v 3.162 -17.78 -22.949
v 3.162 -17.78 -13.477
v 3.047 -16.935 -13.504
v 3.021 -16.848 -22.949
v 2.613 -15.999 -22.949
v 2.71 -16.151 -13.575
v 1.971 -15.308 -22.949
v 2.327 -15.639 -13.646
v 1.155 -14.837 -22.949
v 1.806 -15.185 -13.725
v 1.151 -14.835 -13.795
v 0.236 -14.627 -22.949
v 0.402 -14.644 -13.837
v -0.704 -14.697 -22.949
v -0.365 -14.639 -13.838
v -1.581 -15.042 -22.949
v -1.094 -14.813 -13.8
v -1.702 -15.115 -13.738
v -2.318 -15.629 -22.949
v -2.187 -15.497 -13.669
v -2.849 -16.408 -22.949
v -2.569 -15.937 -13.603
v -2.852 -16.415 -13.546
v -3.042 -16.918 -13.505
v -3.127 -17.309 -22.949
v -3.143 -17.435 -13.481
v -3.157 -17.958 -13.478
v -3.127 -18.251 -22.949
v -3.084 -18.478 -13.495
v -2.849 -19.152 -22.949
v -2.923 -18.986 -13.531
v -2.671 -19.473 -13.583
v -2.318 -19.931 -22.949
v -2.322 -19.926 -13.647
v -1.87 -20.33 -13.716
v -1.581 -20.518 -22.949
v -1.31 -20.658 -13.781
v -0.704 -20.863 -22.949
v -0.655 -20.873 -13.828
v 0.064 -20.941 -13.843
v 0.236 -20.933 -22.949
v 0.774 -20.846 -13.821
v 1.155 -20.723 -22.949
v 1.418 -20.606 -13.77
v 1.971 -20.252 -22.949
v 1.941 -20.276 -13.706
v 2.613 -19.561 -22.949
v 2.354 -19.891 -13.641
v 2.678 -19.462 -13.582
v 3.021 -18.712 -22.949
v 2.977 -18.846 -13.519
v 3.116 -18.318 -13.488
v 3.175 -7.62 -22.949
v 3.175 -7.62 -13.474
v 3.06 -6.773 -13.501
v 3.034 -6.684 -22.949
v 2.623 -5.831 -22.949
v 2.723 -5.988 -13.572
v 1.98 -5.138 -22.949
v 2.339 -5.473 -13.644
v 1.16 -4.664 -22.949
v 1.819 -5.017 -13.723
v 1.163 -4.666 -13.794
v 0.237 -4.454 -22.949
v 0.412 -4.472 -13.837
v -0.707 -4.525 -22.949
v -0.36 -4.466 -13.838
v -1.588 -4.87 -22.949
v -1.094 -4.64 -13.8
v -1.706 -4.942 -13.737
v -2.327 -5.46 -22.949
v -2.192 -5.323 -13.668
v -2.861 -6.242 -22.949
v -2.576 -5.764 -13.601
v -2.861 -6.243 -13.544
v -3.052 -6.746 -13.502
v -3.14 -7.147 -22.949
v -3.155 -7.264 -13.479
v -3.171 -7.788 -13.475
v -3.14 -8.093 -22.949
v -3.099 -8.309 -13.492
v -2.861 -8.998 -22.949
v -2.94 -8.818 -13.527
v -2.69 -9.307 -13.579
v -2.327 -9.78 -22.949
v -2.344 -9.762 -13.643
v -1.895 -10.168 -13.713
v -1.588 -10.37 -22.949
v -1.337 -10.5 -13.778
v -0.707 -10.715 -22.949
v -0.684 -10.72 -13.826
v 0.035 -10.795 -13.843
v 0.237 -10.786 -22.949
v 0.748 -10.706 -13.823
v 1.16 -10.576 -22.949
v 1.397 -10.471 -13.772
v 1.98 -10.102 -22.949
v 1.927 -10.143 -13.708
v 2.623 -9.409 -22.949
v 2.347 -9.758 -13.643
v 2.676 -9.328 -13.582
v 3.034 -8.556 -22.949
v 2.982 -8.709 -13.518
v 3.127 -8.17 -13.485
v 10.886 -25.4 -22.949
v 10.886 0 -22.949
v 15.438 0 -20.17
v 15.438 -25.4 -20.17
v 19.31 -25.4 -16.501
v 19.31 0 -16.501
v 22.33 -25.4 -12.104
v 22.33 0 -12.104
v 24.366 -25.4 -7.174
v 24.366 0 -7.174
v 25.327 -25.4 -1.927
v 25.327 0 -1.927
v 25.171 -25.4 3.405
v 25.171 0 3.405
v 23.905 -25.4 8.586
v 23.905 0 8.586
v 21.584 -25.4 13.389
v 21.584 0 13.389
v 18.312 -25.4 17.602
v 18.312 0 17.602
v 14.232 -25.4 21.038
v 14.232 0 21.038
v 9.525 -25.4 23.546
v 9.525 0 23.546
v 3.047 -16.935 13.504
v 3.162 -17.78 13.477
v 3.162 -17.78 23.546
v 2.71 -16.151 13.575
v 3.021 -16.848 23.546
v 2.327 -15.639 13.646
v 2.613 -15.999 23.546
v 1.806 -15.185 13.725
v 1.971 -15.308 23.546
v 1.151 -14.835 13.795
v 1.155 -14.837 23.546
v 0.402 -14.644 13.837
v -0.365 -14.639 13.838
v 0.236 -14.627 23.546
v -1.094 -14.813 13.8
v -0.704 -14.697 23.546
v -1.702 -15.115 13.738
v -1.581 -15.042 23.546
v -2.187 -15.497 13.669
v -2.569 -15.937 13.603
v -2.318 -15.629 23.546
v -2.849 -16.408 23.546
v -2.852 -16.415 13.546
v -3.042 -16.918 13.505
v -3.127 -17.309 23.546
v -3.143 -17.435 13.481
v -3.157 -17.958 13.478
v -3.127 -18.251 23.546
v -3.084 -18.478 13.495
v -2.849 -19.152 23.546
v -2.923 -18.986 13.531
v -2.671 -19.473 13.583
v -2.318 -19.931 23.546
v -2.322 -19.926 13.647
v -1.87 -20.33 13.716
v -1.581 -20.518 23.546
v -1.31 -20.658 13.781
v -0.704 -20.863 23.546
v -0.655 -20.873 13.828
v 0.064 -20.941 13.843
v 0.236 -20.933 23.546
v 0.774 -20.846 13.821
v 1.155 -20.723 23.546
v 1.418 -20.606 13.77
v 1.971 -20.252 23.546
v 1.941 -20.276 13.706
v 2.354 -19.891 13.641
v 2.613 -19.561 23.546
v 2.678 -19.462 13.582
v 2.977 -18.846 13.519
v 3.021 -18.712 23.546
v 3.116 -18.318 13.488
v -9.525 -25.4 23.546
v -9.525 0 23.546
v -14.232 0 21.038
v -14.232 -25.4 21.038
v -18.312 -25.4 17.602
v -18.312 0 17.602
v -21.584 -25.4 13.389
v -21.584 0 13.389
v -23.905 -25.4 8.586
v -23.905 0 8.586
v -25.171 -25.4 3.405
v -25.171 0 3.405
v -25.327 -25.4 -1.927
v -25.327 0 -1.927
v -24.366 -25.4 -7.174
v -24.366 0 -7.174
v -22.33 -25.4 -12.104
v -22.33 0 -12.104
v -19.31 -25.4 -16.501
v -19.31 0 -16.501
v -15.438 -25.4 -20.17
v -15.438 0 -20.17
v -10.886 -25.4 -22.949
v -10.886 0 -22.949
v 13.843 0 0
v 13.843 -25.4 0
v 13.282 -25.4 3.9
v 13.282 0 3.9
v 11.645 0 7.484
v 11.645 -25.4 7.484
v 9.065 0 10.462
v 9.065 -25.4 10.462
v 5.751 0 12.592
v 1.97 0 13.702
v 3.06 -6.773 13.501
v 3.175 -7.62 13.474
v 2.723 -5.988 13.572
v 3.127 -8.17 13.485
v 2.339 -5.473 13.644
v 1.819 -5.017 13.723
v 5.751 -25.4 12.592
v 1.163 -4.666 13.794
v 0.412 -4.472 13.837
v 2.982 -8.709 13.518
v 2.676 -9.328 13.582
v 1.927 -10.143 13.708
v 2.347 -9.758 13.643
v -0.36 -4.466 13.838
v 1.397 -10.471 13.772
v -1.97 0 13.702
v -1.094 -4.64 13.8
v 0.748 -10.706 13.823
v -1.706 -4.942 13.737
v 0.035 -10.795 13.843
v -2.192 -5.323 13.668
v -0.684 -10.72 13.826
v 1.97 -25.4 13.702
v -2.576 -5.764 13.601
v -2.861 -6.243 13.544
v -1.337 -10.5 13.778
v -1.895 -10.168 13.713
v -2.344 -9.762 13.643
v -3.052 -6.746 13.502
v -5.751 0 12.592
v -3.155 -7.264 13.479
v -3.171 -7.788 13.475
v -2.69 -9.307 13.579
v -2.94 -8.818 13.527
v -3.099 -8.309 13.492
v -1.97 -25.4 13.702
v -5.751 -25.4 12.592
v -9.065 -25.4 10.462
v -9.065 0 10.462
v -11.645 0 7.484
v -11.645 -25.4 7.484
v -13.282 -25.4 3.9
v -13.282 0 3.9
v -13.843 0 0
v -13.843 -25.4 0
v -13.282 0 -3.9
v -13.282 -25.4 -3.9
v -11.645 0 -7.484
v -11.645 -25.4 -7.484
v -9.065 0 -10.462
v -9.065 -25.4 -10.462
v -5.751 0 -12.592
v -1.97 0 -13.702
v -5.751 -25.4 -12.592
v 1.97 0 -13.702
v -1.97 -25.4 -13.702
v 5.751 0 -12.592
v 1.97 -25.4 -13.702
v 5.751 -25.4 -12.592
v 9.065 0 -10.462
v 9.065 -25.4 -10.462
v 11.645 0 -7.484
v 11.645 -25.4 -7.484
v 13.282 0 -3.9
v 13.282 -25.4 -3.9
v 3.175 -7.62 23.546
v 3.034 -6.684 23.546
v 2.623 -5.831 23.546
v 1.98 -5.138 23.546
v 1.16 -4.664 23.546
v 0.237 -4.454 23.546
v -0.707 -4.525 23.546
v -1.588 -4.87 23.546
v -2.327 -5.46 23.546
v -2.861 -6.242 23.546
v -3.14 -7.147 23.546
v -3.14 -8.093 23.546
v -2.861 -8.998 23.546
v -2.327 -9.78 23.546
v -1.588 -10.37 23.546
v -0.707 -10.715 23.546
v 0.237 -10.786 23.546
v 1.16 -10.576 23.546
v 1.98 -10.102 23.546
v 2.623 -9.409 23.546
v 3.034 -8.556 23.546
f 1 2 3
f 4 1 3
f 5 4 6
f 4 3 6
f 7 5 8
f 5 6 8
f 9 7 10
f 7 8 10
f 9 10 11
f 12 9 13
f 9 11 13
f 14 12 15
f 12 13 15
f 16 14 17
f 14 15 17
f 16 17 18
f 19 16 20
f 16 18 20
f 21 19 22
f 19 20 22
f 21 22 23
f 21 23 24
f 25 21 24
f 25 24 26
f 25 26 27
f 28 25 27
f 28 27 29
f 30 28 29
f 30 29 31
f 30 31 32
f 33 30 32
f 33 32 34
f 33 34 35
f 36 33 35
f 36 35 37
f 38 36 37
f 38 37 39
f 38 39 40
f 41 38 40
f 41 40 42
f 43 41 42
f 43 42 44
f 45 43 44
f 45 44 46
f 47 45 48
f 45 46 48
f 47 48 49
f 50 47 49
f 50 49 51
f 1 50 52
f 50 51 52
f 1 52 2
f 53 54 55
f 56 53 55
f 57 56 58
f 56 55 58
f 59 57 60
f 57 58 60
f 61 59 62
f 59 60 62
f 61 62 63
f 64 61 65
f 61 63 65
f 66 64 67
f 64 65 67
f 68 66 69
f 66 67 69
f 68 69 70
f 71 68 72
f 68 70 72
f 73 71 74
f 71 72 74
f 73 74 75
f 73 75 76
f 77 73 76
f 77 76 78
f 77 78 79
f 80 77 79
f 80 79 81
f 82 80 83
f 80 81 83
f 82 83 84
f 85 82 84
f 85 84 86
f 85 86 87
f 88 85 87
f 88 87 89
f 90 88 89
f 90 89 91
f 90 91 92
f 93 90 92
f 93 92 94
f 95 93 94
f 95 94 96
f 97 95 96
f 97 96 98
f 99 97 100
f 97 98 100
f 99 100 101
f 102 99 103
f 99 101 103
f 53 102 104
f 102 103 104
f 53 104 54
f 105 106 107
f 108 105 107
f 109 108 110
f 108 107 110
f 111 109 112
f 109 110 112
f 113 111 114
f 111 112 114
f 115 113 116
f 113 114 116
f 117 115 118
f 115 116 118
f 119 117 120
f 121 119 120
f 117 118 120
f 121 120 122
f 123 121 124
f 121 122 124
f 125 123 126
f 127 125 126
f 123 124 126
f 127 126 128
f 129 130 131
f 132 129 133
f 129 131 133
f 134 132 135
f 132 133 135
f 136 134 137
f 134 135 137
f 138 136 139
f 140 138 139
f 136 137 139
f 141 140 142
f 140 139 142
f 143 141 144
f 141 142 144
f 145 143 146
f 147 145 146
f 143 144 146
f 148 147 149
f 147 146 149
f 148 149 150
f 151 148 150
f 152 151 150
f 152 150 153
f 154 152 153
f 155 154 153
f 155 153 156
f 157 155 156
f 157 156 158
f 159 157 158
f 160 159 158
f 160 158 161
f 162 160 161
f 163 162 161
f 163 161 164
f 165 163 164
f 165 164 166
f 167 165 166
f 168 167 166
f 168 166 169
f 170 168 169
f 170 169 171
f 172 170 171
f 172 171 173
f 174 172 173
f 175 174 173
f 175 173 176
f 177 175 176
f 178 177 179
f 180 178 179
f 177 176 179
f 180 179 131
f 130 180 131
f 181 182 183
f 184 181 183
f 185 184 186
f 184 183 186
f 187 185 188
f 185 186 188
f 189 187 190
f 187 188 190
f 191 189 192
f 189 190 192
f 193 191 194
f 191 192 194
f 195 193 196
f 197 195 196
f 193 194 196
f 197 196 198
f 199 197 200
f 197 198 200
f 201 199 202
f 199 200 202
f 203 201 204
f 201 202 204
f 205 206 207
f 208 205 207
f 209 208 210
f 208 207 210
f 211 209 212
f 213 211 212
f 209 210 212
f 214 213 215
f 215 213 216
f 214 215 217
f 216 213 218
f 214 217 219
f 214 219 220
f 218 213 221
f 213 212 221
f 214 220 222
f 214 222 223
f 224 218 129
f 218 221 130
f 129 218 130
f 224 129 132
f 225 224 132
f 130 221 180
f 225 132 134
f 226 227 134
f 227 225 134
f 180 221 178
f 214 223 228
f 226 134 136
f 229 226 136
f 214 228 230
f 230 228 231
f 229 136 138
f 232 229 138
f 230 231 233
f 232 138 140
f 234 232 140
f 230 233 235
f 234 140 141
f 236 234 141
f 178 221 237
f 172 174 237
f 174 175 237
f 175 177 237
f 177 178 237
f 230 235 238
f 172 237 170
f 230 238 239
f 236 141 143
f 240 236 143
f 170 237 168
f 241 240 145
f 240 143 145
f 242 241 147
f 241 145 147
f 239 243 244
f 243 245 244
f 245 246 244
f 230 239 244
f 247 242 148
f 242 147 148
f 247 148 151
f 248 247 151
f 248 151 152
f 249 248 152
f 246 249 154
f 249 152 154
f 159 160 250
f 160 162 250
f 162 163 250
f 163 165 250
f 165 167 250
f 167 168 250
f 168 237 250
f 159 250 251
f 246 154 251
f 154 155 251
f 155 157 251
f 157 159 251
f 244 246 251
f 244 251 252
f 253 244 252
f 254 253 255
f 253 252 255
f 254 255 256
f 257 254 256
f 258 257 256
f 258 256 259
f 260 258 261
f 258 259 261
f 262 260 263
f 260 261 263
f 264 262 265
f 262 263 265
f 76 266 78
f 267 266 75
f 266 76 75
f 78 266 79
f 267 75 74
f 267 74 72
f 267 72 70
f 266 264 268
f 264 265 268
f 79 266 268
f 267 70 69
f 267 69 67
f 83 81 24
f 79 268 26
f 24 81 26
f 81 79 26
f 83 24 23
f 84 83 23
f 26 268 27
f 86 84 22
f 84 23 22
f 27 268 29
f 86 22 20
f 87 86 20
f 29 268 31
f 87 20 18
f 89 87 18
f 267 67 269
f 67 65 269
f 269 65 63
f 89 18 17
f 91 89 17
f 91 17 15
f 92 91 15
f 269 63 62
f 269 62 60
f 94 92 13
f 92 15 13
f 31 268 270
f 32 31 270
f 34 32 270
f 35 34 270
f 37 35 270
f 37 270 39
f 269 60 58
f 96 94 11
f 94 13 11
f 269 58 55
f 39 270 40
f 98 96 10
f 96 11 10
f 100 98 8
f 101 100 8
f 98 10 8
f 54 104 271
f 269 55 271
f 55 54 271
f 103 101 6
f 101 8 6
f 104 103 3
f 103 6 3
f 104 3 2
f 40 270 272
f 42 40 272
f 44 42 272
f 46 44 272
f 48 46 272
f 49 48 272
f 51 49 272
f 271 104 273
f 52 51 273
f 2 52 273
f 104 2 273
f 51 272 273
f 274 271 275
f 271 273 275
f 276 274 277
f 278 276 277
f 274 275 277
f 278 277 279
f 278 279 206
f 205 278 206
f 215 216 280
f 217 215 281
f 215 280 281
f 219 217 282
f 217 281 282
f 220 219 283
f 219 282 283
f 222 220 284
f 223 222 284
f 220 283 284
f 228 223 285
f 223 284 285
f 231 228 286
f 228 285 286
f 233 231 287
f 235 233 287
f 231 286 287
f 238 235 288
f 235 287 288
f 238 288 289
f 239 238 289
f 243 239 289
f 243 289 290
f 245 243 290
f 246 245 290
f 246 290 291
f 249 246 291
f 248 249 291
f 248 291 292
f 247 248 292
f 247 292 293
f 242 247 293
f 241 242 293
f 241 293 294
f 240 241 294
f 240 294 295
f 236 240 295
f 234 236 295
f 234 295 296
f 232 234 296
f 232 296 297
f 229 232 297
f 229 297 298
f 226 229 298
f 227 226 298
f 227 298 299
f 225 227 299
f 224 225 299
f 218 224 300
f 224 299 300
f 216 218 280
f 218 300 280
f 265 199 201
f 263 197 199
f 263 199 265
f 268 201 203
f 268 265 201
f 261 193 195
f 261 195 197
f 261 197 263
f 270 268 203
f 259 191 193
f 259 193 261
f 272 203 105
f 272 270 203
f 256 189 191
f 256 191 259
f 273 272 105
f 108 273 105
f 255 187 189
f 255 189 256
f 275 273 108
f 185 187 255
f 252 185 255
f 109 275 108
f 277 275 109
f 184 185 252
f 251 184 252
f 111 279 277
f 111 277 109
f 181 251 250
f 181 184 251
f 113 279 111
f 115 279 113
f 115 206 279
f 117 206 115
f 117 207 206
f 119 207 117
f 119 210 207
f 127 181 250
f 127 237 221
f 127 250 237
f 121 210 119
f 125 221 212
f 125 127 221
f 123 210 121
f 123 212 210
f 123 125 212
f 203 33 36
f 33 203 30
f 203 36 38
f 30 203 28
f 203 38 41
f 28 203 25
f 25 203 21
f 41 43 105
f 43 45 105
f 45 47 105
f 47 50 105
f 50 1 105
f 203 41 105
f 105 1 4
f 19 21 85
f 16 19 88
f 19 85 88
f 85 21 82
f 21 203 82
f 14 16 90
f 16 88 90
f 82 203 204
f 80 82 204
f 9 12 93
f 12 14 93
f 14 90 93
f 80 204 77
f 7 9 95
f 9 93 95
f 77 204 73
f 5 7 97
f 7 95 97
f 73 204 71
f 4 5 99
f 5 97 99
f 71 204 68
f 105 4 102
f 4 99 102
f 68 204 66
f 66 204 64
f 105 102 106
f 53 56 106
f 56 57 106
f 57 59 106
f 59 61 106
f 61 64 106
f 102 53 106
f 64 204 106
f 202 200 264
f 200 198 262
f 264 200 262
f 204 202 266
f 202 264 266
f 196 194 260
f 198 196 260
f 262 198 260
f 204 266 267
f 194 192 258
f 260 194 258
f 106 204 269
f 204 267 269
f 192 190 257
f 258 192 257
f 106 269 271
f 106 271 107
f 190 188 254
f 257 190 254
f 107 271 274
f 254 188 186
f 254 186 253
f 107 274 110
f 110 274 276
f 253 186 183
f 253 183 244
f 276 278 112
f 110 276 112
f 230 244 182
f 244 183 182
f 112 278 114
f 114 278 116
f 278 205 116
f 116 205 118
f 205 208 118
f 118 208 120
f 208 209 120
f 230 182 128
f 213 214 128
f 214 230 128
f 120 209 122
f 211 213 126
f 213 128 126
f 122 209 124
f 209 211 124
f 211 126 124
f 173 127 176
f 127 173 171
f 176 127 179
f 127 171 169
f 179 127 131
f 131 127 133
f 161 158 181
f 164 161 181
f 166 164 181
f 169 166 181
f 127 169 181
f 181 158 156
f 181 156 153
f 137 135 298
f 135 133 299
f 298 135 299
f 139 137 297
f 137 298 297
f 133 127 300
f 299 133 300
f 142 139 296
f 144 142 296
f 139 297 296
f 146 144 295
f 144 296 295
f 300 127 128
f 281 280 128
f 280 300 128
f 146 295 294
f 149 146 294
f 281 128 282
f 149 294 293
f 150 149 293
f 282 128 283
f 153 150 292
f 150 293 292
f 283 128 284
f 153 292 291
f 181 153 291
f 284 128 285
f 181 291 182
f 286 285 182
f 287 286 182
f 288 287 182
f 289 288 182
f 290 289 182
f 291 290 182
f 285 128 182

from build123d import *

# Parameters (mm, degrees)
F0_R     = 1.5875
F1_DEPTH = 25.4
F2_R     = 3.175
F2_R_2   = 3.161961
F3_DEPTH = 46.496531
F4_R     = 13.843
F5_DEPTH = 25.401


with BuildPart() as f1:
    # F0 (on Front) → F1 (new body)
    with BuildSketch(Plane.XZ):
        with BuildLine():
            Line((9.525, 23.54643), (-9.525, 23.54643))
            ThreePointArc((-9.525, 23.54643), (-25.38913, 0.743025), (-10.885714, -22.949101))
            Line((-10.885714, -22.949101), (10.885714, -22.949101))
            ThreePointArc((10.885714, -22.949101), (25.38913, 0.743025), (9.525, 23.54643))
        make_face()
        Circle(F0_R, mode=Mode.SUBTRACT)
    extrude(amount=F1_DEPTH)

    # F2 (on face) → F3 (cut, through all)
    with BuildSketch(Plane.XY.offset(23.54643)):
        with Locations((0, -7.62)):
            Circle(F2_R)
        with Locations((0, -17.78)):
            Circle(F2_R_2)
    extrude(amount=-F3_DEPTH, mode=Mode.SUBTRACT)

    # F4 (on face) → F5 (cut, through all)
    with BuildSketch(Plane.XZ.offset(25.4)):
        Circle(F4_R)
    extrude(amount=-F5_DEPTH, mode=Mode.SUBTRACT)


solid = f1.part
